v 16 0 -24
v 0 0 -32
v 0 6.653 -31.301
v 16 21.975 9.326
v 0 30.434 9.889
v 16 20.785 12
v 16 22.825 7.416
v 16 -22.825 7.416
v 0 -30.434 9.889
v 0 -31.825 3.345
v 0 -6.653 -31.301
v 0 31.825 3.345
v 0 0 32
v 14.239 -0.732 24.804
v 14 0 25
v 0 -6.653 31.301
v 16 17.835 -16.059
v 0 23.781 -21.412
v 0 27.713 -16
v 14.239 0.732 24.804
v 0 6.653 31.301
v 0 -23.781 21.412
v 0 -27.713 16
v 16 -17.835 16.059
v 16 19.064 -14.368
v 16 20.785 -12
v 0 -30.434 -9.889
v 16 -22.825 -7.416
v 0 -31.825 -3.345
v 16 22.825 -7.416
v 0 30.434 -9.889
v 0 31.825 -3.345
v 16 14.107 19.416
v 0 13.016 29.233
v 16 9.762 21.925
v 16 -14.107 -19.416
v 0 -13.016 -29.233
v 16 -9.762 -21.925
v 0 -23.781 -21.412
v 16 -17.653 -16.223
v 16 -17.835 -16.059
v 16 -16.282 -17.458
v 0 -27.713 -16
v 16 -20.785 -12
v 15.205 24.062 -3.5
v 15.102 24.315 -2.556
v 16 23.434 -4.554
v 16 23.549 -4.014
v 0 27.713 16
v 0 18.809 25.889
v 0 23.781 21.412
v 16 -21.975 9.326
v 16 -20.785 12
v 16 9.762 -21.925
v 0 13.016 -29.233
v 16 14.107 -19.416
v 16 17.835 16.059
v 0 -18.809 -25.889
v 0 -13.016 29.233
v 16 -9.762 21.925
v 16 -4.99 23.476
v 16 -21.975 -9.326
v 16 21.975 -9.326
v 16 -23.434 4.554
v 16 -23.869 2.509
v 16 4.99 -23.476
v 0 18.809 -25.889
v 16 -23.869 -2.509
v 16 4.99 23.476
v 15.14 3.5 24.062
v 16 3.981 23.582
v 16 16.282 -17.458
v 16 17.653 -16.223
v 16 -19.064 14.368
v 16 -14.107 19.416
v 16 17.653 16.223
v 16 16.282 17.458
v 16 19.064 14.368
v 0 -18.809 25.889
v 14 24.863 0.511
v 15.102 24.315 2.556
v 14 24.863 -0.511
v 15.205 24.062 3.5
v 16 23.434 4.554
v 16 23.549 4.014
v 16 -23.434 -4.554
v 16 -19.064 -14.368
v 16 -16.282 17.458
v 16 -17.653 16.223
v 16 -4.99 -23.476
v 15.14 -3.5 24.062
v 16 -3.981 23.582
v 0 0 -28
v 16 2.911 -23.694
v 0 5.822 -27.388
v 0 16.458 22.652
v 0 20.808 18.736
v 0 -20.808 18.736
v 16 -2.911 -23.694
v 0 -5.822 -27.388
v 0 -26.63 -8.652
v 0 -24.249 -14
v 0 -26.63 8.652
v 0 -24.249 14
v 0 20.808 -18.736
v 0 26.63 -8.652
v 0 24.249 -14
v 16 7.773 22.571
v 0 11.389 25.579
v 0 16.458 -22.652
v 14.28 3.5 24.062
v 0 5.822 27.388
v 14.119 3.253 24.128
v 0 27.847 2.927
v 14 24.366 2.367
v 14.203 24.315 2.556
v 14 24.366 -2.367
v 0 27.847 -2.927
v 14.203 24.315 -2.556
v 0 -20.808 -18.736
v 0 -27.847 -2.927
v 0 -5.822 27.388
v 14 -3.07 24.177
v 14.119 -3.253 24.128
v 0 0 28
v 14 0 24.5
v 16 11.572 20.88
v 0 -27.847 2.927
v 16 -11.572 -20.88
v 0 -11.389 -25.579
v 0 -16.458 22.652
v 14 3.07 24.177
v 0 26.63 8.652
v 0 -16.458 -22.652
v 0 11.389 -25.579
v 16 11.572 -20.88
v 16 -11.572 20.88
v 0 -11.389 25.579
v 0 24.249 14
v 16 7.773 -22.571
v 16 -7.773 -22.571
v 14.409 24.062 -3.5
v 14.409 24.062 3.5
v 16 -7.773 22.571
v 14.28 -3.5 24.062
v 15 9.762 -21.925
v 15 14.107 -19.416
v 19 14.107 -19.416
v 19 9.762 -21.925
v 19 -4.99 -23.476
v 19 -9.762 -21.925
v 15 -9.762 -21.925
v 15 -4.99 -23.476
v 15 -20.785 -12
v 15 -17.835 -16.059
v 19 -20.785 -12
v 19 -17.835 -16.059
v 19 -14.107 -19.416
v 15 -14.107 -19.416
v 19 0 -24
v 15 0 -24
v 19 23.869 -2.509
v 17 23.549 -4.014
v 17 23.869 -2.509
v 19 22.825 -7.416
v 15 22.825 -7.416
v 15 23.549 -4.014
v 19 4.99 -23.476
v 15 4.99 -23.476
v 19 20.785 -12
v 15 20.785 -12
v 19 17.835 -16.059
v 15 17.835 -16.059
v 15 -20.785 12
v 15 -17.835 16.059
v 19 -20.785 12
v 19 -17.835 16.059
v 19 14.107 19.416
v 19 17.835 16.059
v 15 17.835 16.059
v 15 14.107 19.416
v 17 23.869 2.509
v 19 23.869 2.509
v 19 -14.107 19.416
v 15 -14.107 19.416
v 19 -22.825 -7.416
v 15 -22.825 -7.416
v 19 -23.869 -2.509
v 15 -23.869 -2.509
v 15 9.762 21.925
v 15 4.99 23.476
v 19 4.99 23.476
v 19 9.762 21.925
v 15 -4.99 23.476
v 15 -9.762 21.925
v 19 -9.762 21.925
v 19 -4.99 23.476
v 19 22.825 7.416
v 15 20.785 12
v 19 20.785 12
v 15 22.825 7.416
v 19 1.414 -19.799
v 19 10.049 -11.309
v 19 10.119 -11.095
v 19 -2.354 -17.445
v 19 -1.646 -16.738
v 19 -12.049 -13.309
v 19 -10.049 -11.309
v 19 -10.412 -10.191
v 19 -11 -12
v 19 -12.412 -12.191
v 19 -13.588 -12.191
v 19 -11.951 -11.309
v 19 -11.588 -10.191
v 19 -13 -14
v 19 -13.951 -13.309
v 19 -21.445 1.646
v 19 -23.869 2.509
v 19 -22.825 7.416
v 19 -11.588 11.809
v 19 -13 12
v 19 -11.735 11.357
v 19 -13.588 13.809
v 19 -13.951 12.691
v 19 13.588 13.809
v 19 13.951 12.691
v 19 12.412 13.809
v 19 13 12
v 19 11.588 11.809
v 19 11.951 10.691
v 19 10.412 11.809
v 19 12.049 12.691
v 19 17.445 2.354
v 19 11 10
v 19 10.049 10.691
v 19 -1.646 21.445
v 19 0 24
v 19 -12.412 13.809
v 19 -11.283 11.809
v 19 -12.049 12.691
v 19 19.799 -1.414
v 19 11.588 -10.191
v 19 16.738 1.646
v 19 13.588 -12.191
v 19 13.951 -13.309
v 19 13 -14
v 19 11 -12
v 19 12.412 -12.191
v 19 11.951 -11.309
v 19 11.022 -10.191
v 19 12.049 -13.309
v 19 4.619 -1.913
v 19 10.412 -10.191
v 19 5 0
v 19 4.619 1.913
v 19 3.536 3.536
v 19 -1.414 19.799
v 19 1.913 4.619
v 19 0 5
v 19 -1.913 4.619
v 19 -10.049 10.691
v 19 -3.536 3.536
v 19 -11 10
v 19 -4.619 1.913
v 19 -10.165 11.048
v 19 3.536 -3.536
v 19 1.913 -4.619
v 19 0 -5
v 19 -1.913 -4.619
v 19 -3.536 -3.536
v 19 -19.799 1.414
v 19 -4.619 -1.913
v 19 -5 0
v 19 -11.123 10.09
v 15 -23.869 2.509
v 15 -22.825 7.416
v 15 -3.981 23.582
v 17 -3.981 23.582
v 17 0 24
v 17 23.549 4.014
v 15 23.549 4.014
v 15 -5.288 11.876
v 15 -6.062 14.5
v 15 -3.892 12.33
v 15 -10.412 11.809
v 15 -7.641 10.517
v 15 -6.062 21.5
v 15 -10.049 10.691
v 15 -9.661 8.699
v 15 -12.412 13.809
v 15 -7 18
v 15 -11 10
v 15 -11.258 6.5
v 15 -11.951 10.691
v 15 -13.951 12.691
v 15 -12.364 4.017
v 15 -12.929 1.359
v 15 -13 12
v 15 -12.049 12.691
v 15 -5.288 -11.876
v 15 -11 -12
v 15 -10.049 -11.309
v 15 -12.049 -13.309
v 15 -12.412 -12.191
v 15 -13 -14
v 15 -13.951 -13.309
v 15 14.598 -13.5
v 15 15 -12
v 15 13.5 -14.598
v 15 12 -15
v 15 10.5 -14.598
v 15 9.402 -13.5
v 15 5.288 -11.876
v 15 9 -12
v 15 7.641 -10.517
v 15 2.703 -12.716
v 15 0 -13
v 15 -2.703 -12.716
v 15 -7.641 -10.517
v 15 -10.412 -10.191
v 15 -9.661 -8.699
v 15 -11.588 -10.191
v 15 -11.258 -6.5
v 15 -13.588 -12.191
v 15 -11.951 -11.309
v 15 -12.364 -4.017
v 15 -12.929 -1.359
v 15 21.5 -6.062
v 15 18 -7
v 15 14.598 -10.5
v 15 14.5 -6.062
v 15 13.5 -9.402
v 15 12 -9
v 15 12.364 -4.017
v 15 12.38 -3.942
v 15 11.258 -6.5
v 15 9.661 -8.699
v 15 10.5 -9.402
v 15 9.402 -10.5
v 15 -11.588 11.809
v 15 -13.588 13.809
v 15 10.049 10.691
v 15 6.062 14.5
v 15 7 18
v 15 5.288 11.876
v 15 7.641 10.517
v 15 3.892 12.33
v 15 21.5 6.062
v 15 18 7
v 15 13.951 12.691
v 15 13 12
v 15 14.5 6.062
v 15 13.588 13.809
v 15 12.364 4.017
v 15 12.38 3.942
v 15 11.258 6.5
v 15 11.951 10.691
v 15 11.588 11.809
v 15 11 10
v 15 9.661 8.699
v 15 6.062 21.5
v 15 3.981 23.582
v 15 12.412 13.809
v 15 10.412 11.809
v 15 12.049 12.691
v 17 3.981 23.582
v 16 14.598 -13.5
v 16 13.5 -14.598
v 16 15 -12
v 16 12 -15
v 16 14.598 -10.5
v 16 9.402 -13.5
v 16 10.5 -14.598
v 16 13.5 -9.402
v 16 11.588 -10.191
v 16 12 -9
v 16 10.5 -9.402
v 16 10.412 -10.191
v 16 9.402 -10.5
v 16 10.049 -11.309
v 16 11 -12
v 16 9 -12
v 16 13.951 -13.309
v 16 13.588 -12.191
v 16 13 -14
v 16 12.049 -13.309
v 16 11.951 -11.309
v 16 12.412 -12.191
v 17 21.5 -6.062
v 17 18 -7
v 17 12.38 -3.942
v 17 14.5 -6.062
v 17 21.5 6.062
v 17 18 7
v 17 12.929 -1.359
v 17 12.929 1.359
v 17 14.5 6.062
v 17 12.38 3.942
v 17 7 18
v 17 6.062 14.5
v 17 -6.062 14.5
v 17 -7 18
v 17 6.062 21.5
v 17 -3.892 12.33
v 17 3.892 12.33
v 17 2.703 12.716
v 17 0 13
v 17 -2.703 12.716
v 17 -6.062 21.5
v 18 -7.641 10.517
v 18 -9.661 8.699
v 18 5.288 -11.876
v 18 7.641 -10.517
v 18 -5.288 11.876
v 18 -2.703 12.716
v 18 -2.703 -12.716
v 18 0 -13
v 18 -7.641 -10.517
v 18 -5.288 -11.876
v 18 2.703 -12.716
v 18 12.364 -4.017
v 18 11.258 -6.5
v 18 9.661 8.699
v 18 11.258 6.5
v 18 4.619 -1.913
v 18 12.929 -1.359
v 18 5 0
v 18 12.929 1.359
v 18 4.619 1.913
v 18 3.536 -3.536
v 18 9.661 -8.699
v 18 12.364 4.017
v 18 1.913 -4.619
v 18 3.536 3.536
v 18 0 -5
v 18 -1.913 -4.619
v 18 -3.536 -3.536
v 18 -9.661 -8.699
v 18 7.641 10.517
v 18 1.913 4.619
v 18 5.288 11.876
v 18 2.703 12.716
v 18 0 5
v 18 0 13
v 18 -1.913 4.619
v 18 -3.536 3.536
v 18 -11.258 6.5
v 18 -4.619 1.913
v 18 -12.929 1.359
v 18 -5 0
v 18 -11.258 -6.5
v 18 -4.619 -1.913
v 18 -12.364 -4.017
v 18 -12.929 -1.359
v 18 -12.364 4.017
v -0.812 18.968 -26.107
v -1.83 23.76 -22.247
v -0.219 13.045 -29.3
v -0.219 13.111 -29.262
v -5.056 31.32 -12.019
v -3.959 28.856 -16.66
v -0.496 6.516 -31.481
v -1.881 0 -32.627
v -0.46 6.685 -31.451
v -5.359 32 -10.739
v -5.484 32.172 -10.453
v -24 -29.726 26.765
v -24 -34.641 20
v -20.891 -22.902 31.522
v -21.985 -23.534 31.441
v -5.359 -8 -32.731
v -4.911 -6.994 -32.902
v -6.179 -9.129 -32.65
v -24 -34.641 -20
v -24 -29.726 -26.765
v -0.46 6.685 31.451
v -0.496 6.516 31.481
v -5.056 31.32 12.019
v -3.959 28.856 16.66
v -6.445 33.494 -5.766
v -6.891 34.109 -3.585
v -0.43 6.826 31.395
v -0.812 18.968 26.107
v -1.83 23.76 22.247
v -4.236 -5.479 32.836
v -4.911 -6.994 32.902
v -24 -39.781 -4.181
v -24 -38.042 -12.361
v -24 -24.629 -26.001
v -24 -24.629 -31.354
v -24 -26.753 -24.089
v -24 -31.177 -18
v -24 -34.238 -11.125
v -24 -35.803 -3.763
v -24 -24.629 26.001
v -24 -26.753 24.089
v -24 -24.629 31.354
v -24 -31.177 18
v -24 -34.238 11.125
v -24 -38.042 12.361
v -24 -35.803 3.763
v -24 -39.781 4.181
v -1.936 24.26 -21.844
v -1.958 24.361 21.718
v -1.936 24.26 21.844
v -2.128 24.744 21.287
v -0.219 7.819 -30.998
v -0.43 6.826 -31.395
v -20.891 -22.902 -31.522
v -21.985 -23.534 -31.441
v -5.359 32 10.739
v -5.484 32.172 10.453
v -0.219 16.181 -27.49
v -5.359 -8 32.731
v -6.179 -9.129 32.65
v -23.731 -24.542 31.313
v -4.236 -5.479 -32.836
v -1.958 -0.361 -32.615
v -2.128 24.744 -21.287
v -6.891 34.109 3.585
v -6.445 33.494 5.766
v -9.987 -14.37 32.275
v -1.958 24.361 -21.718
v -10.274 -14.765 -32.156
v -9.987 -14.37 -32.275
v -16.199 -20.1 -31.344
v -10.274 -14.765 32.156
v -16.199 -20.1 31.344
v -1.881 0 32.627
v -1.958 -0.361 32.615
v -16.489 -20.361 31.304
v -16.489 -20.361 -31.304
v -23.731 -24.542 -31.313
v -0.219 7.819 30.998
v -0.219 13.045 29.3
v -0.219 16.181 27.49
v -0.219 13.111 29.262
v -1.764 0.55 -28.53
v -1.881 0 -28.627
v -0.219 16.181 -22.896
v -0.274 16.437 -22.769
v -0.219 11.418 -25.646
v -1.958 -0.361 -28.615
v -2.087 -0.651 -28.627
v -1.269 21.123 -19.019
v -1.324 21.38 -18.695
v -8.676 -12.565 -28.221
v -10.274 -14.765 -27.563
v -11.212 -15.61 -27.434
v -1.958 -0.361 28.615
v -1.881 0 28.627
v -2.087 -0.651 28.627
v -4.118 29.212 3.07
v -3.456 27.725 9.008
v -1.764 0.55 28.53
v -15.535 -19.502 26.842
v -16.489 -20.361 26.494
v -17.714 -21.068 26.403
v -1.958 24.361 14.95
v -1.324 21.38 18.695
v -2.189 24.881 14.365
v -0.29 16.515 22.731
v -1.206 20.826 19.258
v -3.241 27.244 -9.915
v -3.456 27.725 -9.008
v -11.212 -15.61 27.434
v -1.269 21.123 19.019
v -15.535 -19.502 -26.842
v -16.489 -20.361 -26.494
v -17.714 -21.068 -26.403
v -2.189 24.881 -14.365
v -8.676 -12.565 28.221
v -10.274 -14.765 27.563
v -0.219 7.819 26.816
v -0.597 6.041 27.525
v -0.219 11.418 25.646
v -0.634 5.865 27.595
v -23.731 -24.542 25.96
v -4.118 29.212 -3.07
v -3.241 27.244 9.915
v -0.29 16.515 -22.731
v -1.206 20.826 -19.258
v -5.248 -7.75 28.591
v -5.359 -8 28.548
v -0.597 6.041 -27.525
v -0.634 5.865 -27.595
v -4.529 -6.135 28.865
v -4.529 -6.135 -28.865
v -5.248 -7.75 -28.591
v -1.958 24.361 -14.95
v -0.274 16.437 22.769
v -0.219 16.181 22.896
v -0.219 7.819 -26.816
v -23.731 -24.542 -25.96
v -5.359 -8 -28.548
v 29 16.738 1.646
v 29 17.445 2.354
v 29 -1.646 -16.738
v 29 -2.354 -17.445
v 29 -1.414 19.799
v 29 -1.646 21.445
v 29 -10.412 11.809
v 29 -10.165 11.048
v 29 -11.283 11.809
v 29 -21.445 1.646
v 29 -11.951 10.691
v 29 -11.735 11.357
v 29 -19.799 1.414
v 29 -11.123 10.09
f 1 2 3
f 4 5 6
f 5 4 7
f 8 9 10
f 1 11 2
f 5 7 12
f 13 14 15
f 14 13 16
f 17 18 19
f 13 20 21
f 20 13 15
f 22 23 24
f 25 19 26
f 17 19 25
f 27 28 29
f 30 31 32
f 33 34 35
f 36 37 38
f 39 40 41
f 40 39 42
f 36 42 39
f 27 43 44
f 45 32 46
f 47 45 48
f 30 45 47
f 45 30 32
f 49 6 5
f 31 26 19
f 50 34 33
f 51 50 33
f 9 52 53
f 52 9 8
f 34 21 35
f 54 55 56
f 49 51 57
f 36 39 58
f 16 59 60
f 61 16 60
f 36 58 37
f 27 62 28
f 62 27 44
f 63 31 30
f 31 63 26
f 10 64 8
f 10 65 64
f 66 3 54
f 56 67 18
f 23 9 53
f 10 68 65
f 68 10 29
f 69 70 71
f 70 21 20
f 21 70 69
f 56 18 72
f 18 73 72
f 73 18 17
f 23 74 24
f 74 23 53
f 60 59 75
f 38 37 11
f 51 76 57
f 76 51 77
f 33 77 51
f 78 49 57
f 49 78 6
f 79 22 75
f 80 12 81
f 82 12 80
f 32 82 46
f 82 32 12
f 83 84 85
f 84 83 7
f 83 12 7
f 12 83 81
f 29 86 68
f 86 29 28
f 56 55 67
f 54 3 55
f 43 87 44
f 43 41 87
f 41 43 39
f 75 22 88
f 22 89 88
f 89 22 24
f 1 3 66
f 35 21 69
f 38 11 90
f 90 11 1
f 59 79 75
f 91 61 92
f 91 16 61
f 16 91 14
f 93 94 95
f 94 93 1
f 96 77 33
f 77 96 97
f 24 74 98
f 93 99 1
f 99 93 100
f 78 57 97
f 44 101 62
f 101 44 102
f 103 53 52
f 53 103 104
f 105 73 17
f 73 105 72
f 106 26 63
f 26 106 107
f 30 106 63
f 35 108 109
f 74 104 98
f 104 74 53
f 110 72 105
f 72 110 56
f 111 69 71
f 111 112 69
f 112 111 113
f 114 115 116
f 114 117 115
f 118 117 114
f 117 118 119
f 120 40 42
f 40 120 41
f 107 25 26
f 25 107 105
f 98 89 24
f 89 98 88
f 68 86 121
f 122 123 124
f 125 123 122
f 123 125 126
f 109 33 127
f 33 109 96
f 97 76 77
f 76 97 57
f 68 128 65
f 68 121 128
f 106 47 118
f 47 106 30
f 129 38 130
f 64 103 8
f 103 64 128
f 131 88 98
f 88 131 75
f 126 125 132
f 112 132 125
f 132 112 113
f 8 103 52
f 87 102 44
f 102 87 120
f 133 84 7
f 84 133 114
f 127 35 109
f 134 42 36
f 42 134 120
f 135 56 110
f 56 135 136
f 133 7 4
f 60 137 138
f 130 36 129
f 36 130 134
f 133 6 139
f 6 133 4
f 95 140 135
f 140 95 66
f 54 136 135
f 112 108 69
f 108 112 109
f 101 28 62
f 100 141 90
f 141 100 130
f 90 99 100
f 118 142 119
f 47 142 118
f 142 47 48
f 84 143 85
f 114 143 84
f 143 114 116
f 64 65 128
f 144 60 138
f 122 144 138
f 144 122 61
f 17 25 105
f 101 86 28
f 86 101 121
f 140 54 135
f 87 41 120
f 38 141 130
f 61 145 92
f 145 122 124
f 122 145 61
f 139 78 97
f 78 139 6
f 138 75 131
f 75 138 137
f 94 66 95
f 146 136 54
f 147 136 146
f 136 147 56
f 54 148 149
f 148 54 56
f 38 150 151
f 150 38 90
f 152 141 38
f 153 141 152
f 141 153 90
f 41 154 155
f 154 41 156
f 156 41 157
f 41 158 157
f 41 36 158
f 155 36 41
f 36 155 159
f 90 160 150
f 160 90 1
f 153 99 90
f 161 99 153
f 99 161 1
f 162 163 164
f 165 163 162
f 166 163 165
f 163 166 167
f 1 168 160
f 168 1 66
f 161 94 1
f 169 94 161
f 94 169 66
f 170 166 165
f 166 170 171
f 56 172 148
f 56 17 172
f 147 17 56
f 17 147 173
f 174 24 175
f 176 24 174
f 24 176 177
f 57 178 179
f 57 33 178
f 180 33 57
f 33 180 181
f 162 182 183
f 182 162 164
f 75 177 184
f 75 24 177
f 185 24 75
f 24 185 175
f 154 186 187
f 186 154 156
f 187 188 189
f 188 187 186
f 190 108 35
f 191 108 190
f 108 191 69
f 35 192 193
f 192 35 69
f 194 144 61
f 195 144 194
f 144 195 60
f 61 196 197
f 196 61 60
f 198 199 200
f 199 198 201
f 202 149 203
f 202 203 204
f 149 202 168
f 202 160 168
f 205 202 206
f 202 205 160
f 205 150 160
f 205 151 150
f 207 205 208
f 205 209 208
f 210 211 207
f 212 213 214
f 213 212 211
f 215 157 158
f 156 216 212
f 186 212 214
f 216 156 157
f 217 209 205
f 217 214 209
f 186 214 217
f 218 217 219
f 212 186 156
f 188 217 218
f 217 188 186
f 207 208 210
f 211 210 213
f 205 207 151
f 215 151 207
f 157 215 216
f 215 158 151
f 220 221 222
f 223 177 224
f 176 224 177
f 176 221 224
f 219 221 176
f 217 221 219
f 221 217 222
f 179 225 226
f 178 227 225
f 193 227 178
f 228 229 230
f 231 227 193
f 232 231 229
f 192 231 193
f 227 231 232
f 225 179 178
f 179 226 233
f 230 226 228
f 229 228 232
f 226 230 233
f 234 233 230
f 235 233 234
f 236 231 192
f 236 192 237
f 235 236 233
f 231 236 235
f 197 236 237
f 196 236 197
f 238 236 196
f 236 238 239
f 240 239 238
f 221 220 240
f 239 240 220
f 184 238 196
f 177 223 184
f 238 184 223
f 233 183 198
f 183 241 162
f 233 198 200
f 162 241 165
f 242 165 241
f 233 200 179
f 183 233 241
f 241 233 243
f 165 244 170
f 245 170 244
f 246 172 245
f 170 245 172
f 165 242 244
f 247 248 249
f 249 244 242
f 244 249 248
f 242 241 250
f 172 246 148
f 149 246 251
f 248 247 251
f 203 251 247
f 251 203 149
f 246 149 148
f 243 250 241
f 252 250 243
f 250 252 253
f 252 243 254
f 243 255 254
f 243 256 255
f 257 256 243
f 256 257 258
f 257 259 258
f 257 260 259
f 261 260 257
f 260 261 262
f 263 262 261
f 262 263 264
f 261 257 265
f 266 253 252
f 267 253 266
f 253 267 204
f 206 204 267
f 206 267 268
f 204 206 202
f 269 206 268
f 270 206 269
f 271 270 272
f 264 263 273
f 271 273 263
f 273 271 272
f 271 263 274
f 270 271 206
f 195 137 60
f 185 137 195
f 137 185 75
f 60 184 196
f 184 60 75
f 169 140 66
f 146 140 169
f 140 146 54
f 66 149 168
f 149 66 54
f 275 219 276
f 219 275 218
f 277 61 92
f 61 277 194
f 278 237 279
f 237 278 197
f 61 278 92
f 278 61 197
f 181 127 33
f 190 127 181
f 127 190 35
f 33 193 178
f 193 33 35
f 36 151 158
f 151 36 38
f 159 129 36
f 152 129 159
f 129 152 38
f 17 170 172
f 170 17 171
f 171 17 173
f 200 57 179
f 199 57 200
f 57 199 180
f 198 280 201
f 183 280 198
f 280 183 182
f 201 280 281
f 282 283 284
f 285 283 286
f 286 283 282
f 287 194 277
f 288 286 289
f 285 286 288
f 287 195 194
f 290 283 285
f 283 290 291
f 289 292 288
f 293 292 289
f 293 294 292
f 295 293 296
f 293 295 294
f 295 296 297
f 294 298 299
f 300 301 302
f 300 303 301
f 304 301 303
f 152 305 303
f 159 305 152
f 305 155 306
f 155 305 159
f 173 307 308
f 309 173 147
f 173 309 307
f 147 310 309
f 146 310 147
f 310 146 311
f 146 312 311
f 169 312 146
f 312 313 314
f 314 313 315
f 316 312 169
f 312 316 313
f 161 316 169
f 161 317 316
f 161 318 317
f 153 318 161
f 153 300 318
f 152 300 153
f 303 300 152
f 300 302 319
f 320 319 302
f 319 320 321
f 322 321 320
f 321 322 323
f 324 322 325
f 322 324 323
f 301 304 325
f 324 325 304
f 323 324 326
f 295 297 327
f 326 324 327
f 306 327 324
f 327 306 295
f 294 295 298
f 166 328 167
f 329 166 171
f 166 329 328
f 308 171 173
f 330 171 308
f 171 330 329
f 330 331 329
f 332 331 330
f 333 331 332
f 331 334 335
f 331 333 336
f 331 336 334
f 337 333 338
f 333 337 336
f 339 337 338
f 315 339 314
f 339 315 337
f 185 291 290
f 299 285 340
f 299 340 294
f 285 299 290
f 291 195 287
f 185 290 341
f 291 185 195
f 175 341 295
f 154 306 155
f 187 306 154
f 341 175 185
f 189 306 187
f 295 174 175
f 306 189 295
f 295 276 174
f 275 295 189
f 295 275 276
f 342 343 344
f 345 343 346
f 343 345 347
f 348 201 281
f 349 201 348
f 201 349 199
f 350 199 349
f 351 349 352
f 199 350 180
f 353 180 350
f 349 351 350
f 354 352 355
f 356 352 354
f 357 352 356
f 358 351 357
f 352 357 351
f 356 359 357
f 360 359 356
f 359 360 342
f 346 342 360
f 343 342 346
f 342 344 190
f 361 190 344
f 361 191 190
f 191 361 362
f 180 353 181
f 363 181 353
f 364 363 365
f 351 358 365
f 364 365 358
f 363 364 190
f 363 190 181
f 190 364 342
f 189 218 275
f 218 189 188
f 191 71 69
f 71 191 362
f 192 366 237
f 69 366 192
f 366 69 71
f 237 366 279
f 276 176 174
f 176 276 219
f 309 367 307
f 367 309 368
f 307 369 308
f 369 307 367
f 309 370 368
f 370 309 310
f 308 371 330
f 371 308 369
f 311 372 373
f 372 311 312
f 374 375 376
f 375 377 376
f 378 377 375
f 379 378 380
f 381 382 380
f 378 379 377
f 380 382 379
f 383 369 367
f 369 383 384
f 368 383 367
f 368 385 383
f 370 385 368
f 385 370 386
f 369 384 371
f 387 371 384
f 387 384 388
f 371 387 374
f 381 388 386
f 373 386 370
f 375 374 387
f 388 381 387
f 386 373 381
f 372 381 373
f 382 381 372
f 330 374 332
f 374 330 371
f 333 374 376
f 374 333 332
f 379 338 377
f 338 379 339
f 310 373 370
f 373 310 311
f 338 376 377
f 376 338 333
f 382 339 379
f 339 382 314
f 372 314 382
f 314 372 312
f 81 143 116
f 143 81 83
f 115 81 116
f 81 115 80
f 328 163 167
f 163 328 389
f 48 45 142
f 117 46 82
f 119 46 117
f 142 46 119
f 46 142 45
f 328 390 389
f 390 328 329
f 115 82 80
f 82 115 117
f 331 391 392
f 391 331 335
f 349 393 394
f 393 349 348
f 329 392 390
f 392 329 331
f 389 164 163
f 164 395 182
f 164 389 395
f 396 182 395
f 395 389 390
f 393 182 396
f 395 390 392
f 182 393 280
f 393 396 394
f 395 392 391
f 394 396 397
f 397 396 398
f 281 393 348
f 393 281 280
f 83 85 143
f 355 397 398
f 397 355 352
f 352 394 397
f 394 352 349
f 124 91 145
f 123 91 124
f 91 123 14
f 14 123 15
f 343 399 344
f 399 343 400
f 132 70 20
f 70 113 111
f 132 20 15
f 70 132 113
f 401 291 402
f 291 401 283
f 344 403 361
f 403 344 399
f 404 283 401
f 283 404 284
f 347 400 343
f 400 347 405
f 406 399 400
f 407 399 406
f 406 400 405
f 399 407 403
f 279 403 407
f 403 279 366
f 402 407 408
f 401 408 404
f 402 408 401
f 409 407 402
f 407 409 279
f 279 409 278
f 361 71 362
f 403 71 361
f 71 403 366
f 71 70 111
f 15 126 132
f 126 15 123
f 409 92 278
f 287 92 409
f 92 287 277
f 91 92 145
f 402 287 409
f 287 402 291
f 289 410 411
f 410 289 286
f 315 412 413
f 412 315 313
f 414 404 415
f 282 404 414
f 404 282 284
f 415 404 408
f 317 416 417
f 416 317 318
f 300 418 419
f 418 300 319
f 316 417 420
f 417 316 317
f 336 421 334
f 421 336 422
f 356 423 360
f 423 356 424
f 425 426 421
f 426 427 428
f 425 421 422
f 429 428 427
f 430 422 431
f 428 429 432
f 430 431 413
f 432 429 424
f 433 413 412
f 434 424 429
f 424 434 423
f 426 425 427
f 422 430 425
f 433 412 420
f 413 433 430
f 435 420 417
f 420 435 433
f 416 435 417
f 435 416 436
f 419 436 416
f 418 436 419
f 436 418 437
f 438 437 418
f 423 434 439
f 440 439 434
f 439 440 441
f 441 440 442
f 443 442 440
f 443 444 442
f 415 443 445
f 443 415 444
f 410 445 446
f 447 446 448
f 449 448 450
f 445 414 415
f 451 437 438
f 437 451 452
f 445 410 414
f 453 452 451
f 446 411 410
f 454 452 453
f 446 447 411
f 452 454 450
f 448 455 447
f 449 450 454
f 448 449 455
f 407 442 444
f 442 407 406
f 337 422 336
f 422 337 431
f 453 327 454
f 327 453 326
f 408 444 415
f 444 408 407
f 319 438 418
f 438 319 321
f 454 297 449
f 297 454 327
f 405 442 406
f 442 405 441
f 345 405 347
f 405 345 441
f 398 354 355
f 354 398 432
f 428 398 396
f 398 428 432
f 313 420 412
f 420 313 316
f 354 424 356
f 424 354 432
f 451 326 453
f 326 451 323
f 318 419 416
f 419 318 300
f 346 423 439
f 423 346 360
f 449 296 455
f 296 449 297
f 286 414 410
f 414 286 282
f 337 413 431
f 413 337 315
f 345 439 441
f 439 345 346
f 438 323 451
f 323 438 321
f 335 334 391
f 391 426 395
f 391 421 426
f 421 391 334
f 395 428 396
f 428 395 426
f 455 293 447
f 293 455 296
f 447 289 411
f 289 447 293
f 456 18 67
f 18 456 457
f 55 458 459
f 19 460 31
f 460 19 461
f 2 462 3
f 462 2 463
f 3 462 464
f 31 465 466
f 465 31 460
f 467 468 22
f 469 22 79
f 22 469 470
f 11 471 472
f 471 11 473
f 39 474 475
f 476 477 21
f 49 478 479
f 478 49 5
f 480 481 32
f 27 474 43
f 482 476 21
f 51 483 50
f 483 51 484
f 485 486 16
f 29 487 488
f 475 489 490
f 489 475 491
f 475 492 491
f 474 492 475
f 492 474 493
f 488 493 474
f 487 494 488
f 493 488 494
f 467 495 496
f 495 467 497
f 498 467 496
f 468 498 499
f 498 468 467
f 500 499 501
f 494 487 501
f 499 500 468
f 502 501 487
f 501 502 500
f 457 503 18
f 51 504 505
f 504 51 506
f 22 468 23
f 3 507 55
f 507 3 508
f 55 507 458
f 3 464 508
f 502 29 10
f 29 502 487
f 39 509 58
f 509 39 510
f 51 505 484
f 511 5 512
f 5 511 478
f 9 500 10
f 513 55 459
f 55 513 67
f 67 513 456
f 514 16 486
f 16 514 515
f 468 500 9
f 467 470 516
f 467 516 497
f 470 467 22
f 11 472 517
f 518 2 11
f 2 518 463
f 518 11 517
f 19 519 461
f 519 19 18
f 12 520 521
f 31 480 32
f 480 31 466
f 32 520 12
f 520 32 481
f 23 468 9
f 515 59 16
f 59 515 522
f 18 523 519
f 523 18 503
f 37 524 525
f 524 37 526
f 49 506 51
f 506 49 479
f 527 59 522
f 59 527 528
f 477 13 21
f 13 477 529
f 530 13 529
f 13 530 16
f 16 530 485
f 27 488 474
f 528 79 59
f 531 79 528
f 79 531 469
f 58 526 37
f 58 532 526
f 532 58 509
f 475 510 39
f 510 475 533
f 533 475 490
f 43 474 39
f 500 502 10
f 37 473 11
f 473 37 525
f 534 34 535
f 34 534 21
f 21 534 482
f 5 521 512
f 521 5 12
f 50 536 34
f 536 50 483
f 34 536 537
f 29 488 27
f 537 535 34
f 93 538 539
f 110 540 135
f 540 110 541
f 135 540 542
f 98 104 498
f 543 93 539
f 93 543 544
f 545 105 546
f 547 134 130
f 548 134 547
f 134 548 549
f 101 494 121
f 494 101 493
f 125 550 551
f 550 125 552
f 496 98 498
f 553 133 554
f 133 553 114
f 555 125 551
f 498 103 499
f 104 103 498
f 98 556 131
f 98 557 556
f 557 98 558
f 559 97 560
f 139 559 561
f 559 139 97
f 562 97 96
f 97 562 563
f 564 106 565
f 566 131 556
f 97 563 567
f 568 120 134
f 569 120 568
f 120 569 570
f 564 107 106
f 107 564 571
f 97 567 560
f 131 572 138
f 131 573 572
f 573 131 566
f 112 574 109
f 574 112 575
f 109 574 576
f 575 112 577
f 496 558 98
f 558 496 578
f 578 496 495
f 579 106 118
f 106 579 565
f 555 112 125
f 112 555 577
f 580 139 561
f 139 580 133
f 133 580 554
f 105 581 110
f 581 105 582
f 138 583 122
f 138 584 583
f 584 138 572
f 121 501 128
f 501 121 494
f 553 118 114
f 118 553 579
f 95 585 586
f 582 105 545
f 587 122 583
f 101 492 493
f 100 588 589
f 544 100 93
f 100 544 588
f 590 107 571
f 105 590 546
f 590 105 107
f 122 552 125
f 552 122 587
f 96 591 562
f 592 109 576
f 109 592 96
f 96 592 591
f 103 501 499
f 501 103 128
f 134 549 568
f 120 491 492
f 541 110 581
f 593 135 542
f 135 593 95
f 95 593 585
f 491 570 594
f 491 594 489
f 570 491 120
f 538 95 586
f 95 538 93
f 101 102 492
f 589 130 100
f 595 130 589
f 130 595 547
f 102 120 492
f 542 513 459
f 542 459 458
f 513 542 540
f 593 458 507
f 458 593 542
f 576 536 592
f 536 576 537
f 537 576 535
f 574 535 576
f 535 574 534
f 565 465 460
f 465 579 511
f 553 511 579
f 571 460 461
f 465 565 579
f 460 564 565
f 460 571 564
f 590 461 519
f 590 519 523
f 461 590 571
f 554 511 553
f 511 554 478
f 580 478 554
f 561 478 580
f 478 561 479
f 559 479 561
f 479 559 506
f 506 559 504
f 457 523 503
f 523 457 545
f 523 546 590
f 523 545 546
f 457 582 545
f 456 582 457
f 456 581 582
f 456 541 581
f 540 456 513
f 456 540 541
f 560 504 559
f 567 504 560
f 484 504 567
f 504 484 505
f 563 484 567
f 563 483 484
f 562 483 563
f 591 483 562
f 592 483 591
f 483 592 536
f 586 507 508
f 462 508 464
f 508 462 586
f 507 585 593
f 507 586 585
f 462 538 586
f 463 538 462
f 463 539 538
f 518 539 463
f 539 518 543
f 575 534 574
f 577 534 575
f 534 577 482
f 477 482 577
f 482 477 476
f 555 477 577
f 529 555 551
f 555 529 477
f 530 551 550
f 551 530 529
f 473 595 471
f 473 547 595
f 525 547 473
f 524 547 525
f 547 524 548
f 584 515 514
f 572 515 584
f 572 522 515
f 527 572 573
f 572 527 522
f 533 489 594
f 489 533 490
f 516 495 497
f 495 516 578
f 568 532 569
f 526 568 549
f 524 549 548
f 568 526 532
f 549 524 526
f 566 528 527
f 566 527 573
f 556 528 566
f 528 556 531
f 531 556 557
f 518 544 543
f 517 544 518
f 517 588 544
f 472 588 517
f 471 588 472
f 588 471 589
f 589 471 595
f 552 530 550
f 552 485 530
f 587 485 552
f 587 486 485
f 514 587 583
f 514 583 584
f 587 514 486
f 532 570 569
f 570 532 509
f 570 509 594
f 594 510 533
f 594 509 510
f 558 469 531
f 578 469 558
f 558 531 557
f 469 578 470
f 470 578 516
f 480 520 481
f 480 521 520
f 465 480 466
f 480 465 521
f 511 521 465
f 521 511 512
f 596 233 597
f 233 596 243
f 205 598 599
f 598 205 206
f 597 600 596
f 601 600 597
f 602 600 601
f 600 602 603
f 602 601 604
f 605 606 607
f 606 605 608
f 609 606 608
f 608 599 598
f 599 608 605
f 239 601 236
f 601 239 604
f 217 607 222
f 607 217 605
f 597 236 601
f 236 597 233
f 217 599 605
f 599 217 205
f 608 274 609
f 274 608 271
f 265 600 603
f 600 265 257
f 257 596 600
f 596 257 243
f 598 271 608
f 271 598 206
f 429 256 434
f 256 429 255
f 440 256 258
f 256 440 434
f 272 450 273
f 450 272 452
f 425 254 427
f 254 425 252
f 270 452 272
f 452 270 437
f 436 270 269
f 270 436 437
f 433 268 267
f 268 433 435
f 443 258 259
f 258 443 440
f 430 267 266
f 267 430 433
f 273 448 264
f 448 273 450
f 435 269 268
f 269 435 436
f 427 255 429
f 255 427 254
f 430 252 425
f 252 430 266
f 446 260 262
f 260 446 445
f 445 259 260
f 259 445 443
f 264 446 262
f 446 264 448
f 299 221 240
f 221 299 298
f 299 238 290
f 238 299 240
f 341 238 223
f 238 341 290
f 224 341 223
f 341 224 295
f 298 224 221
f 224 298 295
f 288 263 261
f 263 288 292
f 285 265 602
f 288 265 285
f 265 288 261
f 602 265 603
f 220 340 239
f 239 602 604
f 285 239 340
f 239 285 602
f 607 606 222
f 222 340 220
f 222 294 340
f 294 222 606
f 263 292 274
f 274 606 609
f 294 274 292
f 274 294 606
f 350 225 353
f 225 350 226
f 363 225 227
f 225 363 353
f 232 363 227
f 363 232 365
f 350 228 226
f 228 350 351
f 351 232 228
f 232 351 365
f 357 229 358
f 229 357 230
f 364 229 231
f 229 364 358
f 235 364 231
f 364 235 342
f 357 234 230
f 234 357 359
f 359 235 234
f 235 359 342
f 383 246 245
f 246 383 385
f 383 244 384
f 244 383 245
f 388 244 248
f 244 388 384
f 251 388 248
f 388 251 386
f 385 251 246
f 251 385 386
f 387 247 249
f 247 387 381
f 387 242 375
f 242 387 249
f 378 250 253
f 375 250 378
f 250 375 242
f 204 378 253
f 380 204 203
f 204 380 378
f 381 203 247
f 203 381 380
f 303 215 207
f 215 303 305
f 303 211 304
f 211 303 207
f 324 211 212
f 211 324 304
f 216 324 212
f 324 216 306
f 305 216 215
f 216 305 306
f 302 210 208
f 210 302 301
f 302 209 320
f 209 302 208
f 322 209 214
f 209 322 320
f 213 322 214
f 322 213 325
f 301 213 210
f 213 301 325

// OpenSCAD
//goggles
//union(){}
//intersection(){
//cylinder(height, r1, r2, center=true/false)

difference(){
union(){ //adds pegs for rpi camera mount

union(){

difference(){
union(){
translate([15,0,0]) rotate([90,90,90]) cylinder(4,24,24);
difference(){
//must double the length of this cylinder for focal length
translate([0,0,0]) rotate([90,90,90]) cylinder(16,32,24);
translate([0,0,0]) rotate([90,90,90]) cylinder(32,28,20);
}
}

//LED holes
translate([14,12,-12]) rotate([90,90,90]) cylinder(2,3,3,$fn = 12);
//translate([14,-12,12]) rotate([90,90,90]) cylinder(2,3,3,$fn = 12);
//translate([14,12,12]) rotate([90,90,90]) cylinder(2,3,3,$fn = 12);
//translate([14,-12,-12]) rotate([90,90,90]) cylinder(2,3,3,$fn = 12);


//neopixel insets
translate([14,18,0]) rotate([90,90,90]) cylinder(3,7,7,$fn = 12);
translate([14,0,18]) rotate([90,90,90]) cylinder(3,7,7,$fn = 12);
//translate([14,-18,0]) rotate([90,90,90]) cylinder(3,7,7,$fn = 12);
//translate([14,0,-18]) rotate([90,90,90]) cylinder(3,7,7,$fn = 12);
//pin holes
/*
translate([15,0,-11]) rotate([90,90,90]) cylinder(4,1,1);
translate([15,0,-19]) rotate([90,90,90]) cylinder(4,1,1);
translate([15,3,-15]) rotate([90,90,90]) cylinder(4,1,1);
translate([15,-3,-15]) rotate([90,90,90]) cylinder(4,1,1);
*/

//lens inset
translate([14,0,0]) rotate([90,90,90]) cylinder(4,13,13);
}
//translate([-16,0,0])
difference(){
difference(){
translate([-24,0,0]) rotate([90,90,90]) cylinder(24,40,32);
translate([-24,0,0]) rotate([90,90,90]) cylinder(24,36,28);
}


//vertical cylinder cut
translate([-40,12,-40]) rotate([0,0,90]) cylinder(80,40,40);
//sphere cut
//translate([-20,2,0]) sphere(22);
//cylinder cut
//translate([-20,2,0]) rotate([97,90,90]) cylinder(20,28,14);
}
}

//rpi camera mount
translate([24,-2,2]) rotate([90,45,90]) cube(size = [27, 28, 10], center = true);
//translate([20,0,10]) rotate([90,90,90]) cylinder(10,1,1);
//translate([20,-10,0]) rotate([90,90,90]) cylinder(10,1,1);
//translate([20,0,-10]) rotate([90,90,90]) cylinder(10,1,1);

}

//Rpi mounting bracket
//rpi camera mount
translate([25,0,0]) rotate([90,45,90]) cube(size = [30, 26, 12], center = true);

//camera aperture
translate([17,0,0]) rotate([90,90,90]) cylinder(10,5,5);

//LED pin holes
translate([15,-13,13]) rotate([90,90,90]) cylinder(10,1,1);
translate([15,-11,11]) rotate([90,90,90]) cylinder(20,1,1);
translate([15,13,13]) rotate([90,90,90]) cylinder(10,1,1);
translate([15,11,11]) rotate([90,90,90]) cylinder(10,1,1);
translate([15,13,-13]) rotate([90,90,90]) cylinder(10,1,1);
translate([15,11,-11]) rotate([90,90,90]) cylinder(10,1,1);
translate([15,-13,-13]) rotate([90,90,90]) cylinder(10,1,1);
translate([15,-11,-11]) rotate([90,90,90]) cylinder(10,1,1);

}
